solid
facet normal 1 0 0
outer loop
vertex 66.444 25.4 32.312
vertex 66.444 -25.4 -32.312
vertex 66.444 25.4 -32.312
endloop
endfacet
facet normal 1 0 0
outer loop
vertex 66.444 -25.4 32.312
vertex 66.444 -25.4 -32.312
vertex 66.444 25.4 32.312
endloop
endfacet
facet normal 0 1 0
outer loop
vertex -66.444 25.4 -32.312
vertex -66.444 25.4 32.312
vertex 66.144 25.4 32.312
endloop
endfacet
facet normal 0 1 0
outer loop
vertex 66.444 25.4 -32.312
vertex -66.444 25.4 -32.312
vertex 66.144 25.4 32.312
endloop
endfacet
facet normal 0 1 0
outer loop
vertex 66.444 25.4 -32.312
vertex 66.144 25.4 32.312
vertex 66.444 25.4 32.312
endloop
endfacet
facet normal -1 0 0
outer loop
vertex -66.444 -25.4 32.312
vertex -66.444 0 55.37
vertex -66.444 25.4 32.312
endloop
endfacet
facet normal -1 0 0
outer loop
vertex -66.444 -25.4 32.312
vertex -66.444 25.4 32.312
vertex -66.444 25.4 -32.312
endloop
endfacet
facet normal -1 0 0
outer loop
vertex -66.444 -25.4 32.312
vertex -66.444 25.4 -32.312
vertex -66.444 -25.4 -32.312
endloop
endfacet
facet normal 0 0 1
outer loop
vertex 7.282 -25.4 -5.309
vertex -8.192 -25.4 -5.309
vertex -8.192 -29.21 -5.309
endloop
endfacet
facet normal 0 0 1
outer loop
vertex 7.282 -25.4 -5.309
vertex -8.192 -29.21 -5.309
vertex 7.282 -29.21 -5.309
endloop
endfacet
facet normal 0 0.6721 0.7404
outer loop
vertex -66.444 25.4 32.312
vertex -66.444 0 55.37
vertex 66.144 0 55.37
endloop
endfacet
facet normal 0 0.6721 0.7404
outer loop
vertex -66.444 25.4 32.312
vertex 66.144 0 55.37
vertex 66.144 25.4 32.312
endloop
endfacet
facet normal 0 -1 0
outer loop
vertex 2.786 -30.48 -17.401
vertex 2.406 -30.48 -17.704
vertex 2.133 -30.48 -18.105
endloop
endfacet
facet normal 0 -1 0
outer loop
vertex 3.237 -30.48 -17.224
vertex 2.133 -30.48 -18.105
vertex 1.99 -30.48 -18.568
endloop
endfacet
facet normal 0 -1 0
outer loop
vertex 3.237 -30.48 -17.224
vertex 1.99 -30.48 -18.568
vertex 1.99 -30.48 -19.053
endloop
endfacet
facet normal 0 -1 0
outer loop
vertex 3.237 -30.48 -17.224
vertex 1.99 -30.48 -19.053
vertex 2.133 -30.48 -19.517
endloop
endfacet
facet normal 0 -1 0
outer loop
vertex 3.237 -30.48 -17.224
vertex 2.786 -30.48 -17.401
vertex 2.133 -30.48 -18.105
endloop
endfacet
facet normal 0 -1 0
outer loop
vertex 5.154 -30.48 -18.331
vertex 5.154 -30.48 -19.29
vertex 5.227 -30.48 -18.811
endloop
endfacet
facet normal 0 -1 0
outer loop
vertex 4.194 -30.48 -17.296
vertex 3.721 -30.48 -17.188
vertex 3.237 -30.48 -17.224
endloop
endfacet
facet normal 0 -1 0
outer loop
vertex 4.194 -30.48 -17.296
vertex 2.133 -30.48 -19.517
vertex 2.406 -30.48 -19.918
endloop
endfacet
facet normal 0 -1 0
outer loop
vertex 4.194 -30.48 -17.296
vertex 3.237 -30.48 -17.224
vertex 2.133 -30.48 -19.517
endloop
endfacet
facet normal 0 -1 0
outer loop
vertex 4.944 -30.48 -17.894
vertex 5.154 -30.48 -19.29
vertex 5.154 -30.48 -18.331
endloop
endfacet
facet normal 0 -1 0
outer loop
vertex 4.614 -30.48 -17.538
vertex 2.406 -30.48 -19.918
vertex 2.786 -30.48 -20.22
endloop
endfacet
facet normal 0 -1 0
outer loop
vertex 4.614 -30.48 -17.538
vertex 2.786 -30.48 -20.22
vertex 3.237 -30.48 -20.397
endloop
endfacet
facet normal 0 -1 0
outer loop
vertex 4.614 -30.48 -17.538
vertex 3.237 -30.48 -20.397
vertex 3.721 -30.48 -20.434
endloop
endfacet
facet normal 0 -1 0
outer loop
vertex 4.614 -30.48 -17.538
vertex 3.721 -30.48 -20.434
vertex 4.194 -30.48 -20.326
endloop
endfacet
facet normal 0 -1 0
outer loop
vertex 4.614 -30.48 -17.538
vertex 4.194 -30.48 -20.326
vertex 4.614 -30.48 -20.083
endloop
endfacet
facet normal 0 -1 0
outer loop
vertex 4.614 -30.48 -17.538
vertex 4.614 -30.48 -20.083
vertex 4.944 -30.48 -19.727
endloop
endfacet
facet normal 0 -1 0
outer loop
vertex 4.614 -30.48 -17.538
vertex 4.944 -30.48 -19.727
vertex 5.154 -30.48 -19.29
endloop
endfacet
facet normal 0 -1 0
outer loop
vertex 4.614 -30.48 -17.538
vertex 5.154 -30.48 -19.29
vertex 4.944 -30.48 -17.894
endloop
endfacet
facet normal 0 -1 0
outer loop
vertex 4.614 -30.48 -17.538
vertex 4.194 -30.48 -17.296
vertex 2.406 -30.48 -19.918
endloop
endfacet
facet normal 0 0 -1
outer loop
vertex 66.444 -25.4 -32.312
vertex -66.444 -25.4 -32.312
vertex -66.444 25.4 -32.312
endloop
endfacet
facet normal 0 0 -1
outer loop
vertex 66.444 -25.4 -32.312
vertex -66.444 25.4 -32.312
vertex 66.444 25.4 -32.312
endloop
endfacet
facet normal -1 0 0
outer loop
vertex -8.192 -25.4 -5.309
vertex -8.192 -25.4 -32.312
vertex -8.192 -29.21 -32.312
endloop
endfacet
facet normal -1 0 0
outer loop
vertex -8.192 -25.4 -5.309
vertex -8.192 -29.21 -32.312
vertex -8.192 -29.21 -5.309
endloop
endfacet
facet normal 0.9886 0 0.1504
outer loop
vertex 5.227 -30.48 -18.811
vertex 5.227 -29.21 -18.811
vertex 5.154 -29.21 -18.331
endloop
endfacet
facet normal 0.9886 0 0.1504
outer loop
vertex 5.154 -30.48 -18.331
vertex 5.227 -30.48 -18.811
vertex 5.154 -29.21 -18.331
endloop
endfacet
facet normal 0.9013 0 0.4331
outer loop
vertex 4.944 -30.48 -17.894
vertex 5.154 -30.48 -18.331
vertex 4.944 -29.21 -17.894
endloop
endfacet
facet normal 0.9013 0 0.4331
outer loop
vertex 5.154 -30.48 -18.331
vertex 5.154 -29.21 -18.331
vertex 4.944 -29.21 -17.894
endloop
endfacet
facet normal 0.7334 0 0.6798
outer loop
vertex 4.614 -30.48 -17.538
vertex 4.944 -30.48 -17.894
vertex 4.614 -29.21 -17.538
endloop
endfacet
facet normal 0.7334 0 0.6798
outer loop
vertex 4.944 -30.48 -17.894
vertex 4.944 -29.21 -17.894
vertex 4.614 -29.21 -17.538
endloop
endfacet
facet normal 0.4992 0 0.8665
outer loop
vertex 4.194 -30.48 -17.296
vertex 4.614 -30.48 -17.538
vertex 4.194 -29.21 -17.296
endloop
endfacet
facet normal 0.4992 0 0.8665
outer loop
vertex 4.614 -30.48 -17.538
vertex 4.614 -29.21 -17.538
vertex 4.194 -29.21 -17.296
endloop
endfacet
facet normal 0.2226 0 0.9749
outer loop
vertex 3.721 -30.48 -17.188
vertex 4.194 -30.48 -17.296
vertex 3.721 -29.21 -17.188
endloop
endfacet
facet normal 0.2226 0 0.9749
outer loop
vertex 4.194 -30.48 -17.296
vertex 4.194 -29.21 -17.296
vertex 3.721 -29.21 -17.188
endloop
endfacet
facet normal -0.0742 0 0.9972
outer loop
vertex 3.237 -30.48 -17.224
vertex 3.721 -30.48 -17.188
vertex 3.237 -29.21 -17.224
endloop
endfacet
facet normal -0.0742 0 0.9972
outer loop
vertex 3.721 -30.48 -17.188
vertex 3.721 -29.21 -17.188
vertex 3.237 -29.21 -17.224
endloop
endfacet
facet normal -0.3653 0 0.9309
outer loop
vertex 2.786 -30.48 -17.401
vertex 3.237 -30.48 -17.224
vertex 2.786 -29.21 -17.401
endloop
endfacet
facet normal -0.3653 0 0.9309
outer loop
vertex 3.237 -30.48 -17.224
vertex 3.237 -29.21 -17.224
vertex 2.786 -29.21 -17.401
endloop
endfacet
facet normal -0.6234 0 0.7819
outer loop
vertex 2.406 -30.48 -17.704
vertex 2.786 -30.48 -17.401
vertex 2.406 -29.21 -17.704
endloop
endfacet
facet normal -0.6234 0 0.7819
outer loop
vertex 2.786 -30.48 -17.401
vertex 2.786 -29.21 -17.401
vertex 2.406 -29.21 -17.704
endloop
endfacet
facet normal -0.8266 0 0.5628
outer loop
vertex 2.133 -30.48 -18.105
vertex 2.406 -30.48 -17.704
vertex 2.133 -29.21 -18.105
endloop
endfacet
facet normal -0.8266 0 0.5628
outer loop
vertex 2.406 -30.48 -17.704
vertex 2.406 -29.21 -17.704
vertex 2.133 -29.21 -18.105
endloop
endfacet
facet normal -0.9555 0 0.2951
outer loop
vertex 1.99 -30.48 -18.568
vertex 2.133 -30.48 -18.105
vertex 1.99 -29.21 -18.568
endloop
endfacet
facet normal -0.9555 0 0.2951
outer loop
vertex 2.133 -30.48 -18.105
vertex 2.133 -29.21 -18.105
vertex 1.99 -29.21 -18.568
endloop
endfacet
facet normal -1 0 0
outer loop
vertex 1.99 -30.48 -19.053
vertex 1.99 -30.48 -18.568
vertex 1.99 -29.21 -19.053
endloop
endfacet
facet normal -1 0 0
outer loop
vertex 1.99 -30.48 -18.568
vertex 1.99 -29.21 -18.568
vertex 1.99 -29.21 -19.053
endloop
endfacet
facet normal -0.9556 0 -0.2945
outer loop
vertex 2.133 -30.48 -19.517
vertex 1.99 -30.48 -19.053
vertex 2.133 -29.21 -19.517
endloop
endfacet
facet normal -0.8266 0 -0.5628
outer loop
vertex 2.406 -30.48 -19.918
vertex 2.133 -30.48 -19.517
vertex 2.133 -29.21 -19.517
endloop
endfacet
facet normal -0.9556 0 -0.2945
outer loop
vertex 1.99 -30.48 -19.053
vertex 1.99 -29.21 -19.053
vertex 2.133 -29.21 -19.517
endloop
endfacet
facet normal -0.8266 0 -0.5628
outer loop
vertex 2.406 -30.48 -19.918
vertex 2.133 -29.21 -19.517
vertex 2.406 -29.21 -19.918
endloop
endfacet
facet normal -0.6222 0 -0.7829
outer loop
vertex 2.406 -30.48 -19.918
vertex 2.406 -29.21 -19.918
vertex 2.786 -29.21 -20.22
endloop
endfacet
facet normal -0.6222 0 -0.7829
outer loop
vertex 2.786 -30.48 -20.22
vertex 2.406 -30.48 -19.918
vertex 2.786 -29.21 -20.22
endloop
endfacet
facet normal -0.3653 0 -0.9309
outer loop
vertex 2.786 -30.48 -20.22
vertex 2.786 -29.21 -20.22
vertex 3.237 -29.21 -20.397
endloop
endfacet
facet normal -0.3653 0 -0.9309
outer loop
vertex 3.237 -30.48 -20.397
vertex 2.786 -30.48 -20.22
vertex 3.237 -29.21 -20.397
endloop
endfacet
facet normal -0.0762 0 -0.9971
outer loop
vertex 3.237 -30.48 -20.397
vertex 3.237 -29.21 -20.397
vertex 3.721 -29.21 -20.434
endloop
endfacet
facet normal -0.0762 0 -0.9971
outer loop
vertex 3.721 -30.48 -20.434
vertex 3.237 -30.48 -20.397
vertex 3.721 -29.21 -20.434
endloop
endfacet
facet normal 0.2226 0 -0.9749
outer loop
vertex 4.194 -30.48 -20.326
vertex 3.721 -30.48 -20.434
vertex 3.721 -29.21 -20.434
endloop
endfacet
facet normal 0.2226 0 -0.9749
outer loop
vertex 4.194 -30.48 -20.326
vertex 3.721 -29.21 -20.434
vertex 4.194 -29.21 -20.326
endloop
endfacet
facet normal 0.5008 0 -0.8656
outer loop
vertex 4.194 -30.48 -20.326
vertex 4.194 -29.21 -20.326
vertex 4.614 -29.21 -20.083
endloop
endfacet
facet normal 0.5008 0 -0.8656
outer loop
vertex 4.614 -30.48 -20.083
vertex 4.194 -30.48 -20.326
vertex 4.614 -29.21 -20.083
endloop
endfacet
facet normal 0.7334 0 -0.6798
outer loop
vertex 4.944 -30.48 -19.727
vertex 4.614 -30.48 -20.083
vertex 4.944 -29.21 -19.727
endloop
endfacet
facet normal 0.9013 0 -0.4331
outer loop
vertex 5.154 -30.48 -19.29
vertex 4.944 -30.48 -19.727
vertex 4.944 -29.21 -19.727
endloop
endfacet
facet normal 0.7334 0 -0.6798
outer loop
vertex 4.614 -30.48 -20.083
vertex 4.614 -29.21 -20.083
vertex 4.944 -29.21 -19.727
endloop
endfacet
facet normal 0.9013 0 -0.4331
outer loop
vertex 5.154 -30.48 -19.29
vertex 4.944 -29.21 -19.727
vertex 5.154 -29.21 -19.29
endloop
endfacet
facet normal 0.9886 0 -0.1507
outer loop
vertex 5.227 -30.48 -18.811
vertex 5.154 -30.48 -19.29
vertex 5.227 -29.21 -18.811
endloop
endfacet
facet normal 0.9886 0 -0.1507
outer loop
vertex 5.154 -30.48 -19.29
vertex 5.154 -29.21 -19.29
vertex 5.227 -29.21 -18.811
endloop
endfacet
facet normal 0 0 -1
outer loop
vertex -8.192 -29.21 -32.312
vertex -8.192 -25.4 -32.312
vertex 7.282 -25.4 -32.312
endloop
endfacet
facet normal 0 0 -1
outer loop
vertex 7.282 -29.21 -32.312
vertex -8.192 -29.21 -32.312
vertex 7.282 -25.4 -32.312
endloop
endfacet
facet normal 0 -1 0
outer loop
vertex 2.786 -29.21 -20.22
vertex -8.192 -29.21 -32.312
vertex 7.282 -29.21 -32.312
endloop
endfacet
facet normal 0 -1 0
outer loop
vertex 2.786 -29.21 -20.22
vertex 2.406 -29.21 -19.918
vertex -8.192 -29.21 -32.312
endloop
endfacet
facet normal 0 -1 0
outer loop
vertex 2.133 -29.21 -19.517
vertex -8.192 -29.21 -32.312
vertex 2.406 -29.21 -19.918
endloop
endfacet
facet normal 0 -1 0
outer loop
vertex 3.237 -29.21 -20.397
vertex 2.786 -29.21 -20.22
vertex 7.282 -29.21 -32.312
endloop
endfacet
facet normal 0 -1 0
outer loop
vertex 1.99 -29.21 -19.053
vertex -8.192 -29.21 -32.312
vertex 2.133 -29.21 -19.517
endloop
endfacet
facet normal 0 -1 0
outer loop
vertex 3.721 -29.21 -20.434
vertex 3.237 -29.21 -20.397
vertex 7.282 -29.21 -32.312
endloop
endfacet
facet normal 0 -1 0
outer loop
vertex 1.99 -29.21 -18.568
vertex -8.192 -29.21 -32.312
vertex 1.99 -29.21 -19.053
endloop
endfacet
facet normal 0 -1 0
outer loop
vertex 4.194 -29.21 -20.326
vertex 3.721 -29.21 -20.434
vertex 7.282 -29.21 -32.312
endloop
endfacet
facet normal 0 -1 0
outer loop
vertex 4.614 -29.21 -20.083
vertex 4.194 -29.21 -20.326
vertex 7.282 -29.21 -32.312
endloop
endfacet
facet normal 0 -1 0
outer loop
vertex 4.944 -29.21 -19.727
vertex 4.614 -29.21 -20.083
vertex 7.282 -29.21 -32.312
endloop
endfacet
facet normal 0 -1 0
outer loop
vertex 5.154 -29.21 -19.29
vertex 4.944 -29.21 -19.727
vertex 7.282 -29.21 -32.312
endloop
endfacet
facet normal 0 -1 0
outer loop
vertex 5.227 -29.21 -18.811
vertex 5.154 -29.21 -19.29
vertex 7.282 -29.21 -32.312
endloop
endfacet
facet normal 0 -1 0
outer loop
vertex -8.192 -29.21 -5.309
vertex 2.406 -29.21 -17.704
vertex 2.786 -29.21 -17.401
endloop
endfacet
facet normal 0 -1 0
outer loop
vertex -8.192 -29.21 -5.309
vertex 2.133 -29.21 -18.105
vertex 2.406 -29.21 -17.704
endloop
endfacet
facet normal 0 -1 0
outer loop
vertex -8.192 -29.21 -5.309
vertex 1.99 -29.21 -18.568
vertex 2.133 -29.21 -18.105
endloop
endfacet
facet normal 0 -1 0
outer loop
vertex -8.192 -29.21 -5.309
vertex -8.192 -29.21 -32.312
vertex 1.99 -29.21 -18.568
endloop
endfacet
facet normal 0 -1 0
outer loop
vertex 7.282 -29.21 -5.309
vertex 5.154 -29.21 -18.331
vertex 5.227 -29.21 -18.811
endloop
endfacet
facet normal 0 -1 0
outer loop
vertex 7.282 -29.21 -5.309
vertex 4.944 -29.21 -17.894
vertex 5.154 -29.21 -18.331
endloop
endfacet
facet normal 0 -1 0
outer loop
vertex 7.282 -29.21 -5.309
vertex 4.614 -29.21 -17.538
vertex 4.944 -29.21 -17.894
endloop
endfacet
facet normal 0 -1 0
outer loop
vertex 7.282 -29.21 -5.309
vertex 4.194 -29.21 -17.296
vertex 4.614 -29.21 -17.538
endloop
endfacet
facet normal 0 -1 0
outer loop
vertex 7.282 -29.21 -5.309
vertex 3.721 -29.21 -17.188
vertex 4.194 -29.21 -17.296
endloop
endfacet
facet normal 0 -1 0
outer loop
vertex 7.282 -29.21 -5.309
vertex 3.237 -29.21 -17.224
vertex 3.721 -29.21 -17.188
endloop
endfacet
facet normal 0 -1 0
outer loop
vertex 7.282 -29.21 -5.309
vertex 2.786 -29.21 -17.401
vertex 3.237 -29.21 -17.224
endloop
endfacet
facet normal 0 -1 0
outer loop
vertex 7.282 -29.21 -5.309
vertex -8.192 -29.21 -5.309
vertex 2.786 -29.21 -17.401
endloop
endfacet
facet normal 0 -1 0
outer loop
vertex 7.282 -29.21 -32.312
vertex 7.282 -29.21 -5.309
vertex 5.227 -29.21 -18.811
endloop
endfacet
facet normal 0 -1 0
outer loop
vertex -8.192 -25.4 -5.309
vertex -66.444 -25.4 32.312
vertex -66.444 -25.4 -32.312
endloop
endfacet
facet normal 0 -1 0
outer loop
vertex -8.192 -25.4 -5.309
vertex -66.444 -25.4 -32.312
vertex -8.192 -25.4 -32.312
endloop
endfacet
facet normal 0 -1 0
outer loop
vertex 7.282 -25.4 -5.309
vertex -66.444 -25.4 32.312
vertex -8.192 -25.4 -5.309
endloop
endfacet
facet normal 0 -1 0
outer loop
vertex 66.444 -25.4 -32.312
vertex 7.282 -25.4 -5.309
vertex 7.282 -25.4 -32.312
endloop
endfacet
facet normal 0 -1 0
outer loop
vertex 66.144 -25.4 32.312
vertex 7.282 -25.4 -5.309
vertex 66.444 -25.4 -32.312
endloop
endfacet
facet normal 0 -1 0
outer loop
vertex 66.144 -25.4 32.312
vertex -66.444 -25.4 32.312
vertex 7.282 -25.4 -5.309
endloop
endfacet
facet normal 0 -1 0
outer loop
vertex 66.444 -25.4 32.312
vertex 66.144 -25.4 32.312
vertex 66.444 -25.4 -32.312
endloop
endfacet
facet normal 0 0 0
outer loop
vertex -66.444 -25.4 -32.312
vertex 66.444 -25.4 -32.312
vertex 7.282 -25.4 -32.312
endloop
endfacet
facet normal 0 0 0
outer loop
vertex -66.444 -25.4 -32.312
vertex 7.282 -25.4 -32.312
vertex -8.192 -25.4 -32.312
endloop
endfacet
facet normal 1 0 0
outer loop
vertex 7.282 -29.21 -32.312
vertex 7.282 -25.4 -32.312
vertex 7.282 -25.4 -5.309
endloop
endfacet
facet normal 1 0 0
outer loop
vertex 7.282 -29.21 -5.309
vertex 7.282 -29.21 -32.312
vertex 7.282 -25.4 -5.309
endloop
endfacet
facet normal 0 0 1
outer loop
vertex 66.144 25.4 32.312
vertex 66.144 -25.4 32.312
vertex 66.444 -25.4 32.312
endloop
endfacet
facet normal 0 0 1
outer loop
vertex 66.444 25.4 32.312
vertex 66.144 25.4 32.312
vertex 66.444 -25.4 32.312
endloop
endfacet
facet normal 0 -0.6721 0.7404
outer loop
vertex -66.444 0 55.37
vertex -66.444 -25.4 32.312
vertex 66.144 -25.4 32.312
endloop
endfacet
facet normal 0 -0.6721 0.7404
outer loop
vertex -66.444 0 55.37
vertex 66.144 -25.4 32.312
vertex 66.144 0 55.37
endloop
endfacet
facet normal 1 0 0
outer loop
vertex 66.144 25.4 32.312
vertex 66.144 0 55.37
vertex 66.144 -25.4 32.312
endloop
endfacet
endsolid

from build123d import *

# Parameters (mm, degrees)
F0_W     = 132.888824
F0_H     = 64.624012
F1_DEPTH = 25.4
F2_W     = 15.473353
F2_H     = 27.002521
F3_DEPTH = 3.81
F4_R     = 1.62741
F5_DEPTH = 1.27
F7_DEPTH = 132.588


with BuildPart() as f1:
    # F0 (on Front) → F1 (new body, symmetric)
    with BuildSketch(Plane.XZ):
        Rectangle(F0_W, F0_H)
    extrude(amount=F1_DEPTH, both=True)

    # F2 (on face) → F3 (join)
    with BuildSketch(Plane.XZ.offset(25.4)):
        with Locations((-0.455099, -18.810745)):
            Rectangle(F2_W, F2_H)
    extrude(amount=F3_DEPTH)

    # F4 (on face) → F5 (join)
    with BuildSketch(Plane.XZ.offset(29.21)):
        with Locations((3.599366, -18.810746)):
            Circle(F4_R)
    extrude(amount=F5_DEPTH)

    # F6 (on face) → F7 (join)
    with BuildSketch(Plane(origin=(-66.444412, 0, 0), x_dir=(0, -1, 0), z_dir=(-1, 0, 0))):
        Polygon((25.4, 32.312006), (0, 55.370338), (-25.4, 32.312006), align=None)
    extrude(amount=-F7_DEPTH)


solid = f1.part
